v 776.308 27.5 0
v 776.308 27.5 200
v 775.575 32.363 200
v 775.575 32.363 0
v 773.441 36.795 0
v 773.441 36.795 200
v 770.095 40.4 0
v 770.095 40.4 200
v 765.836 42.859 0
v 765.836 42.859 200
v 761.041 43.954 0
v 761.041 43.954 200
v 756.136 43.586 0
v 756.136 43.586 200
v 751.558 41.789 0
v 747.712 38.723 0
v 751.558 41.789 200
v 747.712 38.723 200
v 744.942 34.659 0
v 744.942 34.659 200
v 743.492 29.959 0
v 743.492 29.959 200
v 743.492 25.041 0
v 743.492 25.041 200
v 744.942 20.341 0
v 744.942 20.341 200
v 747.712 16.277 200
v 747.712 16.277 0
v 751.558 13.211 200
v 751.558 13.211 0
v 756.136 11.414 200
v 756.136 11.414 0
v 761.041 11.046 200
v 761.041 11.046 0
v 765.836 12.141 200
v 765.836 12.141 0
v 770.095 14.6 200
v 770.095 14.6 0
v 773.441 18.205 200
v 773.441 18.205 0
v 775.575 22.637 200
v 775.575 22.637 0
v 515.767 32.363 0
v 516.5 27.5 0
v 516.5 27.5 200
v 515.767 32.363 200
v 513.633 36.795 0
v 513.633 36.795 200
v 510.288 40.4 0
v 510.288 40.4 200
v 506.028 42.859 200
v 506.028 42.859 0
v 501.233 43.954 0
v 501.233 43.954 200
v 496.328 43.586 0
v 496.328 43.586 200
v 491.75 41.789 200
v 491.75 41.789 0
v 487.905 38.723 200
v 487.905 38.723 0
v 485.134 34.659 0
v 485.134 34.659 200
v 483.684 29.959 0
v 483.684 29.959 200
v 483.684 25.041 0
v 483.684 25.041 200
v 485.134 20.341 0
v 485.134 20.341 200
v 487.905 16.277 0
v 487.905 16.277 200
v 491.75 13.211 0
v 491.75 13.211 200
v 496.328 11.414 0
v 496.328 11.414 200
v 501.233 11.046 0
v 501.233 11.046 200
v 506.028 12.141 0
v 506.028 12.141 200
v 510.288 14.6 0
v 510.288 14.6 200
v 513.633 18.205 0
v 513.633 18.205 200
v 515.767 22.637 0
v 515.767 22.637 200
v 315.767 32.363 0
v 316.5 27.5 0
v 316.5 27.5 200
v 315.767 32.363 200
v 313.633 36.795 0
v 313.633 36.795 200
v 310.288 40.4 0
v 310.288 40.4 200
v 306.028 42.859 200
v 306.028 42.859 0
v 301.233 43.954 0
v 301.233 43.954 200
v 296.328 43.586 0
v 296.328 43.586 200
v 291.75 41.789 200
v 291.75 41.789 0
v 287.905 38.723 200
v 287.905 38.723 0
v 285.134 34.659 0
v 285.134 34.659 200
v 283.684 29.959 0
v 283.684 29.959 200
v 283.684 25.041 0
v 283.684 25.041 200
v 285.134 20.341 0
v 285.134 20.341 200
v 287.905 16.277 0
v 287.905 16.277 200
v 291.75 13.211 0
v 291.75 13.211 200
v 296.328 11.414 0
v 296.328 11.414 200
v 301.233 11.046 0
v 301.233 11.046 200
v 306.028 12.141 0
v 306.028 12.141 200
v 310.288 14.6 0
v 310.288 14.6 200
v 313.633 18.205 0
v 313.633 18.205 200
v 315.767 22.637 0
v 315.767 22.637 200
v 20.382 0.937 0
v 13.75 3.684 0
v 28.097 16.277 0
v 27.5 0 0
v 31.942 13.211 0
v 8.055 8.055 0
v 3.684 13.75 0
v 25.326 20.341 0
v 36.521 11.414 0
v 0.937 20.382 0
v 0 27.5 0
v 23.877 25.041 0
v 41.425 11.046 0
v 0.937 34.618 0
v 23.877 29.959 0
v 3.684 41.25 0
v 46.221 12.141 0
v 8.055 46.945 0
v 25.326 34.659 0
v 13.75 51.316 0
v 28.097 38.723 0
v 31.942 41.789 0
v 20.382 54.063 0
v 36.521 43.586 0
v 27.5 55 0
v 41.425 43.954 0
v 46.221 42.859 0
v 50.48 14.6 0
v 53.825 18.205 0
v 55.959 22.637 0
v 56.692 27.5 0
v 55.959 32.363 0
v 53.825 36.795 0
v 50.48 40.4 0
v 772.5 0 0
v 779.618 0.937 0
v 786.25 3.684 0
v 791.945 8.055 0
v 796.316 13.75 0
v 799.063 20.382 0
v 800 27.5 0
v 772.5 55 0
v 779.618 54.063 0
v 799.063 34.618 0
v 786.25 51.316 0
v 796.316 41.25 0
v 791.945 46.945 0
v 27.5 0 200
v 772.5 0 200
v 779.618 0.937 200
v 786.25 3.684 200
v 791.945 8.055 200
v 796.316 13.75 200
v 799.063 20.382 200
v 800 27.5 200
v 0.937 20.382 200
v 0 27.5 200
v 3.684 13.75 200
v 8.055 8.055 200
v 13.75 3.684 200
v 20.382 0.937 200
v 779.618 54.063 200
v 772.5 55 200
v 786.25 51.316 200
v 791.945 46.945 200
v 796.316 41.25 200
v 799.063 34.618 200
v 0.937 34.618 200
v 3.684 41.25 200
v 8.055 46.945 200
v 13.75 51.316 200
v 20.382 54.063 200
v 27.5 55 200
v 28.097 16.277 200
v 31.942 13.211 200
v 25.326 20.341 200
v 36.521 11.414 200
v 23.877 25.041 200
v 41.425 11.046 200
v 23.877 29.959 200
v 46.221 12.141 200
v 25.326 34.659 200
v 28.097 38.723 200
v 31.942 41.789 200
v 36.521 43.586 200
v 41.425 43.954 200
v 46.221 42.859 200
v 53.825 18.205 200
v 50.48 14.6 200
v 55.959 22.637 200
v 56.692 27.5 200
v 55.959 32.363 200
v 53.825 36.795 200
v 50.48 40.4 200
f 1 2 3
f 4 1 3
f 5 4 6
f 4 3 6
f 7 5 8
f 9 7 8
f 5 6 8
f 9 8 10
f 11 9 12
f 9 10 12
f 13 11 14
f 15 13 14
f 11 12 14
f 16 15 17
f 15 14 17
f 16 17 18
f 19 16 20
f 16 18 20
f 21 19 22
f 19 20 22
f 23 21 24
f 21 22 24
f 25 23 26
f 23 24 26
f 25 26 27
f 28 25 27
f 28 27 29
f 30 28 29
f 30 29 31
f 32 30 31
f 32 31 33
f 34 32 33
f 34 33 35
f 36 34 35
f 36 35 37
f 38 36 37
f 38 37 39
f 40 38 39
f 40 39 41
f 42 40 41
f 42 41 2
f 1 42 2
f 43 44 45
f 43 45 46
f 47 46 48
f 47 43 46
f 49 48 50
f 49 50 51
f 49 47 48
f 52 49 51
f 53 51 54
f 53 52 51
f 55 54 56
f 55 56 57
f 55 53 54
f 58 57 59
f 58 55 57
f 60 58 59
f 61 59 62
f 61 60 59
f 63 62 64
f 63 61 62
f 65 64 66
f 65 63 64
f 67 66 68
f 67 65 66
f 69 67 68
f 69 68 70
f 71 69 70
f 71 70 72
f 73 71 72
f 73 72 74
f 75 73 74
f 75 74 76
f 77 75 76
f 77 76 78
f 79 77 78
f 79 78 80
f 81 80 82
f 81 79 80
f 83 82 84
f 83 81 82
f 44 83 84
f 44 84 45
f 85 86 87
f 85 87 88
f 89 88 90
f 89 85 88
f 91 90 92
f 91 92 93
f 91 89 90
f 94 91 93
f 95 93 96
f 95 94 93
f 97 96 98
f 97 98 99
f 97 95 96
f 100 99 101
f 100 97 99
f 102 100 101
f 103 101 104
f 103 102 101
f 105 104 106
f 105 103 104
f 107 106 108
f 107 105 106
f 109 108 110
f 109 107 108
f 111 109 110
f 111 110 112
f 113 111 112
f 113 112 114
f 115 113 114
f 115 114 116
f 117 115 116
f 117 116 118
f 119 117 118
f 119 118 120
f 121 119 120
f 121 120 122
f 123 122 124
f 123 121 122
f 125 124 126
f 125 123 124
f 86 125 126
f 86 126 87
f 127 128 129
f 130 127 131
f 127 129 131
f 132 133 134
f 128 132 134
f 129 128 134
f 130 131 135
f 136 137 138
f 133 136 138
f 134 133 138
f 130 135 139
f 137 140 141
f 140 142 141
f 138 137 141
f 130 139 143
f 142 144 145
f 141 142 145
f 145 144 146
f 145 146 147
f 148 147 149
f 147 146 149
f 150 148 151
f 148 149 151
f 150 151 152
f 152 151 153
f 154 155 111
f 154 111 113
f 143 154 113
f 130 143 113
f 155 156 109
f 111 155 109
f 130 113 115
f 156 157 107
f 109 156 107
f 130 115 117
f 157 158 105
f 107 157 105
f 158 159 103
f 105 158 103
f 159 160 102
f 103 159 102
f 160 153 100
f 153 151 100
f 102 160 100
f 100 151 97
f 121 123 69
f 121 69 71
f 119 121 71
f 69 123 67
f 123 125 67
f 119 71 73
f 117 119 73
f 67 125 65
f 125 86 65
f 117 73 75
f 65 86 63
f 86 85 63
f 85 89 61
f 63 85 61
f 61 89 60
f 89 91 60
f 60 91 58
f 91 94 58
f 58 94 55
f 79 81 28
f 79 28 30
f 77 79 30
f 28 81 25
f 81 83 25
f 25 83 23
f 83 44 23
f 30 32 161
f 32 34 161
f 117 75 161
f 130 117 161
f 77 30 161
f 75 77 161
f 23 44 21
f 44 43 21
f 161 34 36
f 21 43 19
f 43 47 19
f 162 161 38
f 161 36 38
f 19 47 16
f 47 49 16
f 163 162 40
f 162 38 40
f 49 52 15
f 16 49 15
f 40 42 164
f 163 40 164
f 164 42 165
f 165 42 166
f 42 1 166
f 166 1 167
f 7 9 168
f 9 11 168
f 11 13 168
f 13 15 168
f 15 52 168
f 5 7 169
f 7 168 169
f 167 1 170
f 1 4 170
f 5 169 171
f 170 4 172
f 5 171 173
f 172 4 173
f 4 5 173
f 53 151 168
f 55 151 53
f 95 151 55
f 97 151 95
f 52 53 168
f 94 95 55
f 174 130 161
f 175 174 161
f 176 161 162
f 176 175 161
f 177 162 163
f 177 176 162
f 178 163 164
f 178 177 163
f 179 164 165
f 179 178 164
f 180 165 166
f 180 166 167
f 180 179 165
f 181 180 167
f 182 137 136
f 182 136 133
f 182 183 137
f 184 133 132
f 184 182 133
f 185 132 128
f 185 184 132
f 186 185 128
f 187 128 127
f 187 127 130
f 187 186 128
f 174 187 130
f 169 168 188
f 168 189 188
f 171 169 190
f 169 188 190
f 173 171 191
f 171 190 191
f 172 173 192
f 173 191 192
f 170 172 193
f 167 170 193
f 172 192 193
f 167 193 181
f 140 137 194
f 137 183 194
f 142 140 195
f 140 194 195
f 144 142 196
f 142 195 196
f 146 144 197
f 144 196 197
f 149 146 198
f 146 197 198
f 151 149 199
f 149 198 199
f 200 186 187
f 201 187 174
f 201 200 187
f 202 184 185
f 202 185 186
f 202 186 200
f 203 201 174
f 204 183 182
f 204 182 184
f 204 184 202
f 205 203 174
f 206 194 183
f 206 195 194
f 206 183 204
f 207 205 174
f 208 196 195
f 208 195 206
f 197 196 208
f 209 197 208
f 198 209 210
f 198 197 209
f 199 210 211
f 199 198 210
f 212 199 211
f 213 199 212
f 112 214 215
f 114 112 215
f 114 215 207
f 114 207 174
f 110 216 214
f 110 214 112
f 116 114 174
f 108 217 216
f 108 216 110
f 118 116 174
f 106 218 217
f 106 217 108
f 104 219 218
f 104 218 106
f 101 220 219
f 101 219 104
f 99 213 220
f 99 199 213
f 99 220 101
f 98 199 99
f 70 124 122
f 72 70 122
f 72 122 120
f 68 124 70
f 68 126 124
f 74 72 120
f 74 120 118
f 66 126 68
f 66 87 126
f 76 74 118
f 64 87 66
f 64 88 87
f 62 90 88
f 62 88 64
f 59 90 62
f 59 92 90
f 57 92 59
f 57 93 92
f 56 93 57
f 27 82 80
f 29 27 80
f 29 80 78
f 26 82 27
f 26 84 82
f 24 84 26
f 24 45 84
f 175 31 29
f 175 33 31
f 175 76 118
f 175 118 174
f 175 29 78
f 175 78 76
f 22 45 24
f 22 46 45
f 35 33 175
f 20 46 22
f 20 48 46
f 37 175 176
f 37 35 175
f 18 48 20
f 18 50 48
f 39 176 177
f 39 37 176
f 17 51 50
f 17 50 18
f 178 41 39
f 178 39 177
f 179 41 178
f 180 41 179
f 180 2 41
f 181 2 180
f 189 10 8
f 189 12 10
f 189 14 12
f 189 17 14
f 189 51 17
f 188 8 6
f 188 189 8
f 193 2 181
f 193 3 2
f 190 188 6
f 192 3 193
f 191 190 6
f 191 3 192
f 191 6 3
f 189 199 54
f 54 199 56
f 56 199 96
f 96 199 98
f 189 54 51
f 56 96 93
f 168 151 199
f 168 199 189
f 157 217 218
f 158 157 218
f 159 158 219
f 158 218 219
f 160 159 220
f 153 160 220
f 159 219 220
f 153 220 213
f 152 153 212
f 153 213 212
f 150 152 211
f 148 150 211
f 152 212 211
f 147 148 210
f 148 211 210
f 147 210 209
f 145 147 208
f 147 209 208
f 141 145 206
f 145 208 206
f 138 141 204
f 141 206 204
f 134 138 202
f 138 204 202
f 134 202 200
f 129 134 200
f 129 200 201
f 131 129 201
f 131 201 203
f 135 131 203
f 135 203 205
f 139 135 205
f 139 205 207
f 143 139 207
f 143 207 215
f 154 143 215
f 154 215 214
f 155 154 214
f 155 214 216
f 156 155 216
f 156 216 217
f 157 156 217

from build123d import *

# Parameters (mm, degrees)
SKETCH_1_W          = 800
SKETCH_1_H          = 55
SKETCH_1_R          = 16.5
EXTRUDE_1_DEPTH     = 200
SKETCH_2_R          = 16.5
CUT_EXTRUDE_1_DEPTH = 827.453265466
FILLET_1_R          = 27.5


with BuildPart() as part:
    # 草图1 → 凸台-拉伸1 (new body)
    with BuildSketch(Plane.XY):
        with Locations((400, 27.5)):
            Rectangle(SKETCH_1_W, SKETCH_1_H)
        with Locations((300, 27.5)):
            Circle(SKETCH_1_R, mode=Mode.SUBTRACT)
        with Locations((500, 27.5)):
            Circle(SKETCH_1_R, mode=Mode.SUBTRACT)
    extrude(amount=EXTRUDE_1_DEPTH)

    # 草图2 → 切除-拉伸1 (cut, through all)
    with BuildSketch(Plane.XY.offset(200)):
        with Locations((759.807621135, 27.5)):
            Circle(SKETCH_2_R)
        with Locations((40.192378865, 27.5)):
            Circle(SKETCH_2_R)
    extrude(amount=-CUT_EXTRUDE_1_DEPTH, mode=Mode.SUBTRACT)

    # 圆角1
    fillet_1_edges = [part.edges().sort_by_distance(p)[0] for p in [
        (0, 0, 100),
        (0, 55, 100),
        (800, 0, 100),
        (800, 55, 100),
    ]]
    fillet(fillet_1_edges, radius=FILLET_1_R - 0.0001)  # a hair under: the kernel refuses the full size


solid = part.part
